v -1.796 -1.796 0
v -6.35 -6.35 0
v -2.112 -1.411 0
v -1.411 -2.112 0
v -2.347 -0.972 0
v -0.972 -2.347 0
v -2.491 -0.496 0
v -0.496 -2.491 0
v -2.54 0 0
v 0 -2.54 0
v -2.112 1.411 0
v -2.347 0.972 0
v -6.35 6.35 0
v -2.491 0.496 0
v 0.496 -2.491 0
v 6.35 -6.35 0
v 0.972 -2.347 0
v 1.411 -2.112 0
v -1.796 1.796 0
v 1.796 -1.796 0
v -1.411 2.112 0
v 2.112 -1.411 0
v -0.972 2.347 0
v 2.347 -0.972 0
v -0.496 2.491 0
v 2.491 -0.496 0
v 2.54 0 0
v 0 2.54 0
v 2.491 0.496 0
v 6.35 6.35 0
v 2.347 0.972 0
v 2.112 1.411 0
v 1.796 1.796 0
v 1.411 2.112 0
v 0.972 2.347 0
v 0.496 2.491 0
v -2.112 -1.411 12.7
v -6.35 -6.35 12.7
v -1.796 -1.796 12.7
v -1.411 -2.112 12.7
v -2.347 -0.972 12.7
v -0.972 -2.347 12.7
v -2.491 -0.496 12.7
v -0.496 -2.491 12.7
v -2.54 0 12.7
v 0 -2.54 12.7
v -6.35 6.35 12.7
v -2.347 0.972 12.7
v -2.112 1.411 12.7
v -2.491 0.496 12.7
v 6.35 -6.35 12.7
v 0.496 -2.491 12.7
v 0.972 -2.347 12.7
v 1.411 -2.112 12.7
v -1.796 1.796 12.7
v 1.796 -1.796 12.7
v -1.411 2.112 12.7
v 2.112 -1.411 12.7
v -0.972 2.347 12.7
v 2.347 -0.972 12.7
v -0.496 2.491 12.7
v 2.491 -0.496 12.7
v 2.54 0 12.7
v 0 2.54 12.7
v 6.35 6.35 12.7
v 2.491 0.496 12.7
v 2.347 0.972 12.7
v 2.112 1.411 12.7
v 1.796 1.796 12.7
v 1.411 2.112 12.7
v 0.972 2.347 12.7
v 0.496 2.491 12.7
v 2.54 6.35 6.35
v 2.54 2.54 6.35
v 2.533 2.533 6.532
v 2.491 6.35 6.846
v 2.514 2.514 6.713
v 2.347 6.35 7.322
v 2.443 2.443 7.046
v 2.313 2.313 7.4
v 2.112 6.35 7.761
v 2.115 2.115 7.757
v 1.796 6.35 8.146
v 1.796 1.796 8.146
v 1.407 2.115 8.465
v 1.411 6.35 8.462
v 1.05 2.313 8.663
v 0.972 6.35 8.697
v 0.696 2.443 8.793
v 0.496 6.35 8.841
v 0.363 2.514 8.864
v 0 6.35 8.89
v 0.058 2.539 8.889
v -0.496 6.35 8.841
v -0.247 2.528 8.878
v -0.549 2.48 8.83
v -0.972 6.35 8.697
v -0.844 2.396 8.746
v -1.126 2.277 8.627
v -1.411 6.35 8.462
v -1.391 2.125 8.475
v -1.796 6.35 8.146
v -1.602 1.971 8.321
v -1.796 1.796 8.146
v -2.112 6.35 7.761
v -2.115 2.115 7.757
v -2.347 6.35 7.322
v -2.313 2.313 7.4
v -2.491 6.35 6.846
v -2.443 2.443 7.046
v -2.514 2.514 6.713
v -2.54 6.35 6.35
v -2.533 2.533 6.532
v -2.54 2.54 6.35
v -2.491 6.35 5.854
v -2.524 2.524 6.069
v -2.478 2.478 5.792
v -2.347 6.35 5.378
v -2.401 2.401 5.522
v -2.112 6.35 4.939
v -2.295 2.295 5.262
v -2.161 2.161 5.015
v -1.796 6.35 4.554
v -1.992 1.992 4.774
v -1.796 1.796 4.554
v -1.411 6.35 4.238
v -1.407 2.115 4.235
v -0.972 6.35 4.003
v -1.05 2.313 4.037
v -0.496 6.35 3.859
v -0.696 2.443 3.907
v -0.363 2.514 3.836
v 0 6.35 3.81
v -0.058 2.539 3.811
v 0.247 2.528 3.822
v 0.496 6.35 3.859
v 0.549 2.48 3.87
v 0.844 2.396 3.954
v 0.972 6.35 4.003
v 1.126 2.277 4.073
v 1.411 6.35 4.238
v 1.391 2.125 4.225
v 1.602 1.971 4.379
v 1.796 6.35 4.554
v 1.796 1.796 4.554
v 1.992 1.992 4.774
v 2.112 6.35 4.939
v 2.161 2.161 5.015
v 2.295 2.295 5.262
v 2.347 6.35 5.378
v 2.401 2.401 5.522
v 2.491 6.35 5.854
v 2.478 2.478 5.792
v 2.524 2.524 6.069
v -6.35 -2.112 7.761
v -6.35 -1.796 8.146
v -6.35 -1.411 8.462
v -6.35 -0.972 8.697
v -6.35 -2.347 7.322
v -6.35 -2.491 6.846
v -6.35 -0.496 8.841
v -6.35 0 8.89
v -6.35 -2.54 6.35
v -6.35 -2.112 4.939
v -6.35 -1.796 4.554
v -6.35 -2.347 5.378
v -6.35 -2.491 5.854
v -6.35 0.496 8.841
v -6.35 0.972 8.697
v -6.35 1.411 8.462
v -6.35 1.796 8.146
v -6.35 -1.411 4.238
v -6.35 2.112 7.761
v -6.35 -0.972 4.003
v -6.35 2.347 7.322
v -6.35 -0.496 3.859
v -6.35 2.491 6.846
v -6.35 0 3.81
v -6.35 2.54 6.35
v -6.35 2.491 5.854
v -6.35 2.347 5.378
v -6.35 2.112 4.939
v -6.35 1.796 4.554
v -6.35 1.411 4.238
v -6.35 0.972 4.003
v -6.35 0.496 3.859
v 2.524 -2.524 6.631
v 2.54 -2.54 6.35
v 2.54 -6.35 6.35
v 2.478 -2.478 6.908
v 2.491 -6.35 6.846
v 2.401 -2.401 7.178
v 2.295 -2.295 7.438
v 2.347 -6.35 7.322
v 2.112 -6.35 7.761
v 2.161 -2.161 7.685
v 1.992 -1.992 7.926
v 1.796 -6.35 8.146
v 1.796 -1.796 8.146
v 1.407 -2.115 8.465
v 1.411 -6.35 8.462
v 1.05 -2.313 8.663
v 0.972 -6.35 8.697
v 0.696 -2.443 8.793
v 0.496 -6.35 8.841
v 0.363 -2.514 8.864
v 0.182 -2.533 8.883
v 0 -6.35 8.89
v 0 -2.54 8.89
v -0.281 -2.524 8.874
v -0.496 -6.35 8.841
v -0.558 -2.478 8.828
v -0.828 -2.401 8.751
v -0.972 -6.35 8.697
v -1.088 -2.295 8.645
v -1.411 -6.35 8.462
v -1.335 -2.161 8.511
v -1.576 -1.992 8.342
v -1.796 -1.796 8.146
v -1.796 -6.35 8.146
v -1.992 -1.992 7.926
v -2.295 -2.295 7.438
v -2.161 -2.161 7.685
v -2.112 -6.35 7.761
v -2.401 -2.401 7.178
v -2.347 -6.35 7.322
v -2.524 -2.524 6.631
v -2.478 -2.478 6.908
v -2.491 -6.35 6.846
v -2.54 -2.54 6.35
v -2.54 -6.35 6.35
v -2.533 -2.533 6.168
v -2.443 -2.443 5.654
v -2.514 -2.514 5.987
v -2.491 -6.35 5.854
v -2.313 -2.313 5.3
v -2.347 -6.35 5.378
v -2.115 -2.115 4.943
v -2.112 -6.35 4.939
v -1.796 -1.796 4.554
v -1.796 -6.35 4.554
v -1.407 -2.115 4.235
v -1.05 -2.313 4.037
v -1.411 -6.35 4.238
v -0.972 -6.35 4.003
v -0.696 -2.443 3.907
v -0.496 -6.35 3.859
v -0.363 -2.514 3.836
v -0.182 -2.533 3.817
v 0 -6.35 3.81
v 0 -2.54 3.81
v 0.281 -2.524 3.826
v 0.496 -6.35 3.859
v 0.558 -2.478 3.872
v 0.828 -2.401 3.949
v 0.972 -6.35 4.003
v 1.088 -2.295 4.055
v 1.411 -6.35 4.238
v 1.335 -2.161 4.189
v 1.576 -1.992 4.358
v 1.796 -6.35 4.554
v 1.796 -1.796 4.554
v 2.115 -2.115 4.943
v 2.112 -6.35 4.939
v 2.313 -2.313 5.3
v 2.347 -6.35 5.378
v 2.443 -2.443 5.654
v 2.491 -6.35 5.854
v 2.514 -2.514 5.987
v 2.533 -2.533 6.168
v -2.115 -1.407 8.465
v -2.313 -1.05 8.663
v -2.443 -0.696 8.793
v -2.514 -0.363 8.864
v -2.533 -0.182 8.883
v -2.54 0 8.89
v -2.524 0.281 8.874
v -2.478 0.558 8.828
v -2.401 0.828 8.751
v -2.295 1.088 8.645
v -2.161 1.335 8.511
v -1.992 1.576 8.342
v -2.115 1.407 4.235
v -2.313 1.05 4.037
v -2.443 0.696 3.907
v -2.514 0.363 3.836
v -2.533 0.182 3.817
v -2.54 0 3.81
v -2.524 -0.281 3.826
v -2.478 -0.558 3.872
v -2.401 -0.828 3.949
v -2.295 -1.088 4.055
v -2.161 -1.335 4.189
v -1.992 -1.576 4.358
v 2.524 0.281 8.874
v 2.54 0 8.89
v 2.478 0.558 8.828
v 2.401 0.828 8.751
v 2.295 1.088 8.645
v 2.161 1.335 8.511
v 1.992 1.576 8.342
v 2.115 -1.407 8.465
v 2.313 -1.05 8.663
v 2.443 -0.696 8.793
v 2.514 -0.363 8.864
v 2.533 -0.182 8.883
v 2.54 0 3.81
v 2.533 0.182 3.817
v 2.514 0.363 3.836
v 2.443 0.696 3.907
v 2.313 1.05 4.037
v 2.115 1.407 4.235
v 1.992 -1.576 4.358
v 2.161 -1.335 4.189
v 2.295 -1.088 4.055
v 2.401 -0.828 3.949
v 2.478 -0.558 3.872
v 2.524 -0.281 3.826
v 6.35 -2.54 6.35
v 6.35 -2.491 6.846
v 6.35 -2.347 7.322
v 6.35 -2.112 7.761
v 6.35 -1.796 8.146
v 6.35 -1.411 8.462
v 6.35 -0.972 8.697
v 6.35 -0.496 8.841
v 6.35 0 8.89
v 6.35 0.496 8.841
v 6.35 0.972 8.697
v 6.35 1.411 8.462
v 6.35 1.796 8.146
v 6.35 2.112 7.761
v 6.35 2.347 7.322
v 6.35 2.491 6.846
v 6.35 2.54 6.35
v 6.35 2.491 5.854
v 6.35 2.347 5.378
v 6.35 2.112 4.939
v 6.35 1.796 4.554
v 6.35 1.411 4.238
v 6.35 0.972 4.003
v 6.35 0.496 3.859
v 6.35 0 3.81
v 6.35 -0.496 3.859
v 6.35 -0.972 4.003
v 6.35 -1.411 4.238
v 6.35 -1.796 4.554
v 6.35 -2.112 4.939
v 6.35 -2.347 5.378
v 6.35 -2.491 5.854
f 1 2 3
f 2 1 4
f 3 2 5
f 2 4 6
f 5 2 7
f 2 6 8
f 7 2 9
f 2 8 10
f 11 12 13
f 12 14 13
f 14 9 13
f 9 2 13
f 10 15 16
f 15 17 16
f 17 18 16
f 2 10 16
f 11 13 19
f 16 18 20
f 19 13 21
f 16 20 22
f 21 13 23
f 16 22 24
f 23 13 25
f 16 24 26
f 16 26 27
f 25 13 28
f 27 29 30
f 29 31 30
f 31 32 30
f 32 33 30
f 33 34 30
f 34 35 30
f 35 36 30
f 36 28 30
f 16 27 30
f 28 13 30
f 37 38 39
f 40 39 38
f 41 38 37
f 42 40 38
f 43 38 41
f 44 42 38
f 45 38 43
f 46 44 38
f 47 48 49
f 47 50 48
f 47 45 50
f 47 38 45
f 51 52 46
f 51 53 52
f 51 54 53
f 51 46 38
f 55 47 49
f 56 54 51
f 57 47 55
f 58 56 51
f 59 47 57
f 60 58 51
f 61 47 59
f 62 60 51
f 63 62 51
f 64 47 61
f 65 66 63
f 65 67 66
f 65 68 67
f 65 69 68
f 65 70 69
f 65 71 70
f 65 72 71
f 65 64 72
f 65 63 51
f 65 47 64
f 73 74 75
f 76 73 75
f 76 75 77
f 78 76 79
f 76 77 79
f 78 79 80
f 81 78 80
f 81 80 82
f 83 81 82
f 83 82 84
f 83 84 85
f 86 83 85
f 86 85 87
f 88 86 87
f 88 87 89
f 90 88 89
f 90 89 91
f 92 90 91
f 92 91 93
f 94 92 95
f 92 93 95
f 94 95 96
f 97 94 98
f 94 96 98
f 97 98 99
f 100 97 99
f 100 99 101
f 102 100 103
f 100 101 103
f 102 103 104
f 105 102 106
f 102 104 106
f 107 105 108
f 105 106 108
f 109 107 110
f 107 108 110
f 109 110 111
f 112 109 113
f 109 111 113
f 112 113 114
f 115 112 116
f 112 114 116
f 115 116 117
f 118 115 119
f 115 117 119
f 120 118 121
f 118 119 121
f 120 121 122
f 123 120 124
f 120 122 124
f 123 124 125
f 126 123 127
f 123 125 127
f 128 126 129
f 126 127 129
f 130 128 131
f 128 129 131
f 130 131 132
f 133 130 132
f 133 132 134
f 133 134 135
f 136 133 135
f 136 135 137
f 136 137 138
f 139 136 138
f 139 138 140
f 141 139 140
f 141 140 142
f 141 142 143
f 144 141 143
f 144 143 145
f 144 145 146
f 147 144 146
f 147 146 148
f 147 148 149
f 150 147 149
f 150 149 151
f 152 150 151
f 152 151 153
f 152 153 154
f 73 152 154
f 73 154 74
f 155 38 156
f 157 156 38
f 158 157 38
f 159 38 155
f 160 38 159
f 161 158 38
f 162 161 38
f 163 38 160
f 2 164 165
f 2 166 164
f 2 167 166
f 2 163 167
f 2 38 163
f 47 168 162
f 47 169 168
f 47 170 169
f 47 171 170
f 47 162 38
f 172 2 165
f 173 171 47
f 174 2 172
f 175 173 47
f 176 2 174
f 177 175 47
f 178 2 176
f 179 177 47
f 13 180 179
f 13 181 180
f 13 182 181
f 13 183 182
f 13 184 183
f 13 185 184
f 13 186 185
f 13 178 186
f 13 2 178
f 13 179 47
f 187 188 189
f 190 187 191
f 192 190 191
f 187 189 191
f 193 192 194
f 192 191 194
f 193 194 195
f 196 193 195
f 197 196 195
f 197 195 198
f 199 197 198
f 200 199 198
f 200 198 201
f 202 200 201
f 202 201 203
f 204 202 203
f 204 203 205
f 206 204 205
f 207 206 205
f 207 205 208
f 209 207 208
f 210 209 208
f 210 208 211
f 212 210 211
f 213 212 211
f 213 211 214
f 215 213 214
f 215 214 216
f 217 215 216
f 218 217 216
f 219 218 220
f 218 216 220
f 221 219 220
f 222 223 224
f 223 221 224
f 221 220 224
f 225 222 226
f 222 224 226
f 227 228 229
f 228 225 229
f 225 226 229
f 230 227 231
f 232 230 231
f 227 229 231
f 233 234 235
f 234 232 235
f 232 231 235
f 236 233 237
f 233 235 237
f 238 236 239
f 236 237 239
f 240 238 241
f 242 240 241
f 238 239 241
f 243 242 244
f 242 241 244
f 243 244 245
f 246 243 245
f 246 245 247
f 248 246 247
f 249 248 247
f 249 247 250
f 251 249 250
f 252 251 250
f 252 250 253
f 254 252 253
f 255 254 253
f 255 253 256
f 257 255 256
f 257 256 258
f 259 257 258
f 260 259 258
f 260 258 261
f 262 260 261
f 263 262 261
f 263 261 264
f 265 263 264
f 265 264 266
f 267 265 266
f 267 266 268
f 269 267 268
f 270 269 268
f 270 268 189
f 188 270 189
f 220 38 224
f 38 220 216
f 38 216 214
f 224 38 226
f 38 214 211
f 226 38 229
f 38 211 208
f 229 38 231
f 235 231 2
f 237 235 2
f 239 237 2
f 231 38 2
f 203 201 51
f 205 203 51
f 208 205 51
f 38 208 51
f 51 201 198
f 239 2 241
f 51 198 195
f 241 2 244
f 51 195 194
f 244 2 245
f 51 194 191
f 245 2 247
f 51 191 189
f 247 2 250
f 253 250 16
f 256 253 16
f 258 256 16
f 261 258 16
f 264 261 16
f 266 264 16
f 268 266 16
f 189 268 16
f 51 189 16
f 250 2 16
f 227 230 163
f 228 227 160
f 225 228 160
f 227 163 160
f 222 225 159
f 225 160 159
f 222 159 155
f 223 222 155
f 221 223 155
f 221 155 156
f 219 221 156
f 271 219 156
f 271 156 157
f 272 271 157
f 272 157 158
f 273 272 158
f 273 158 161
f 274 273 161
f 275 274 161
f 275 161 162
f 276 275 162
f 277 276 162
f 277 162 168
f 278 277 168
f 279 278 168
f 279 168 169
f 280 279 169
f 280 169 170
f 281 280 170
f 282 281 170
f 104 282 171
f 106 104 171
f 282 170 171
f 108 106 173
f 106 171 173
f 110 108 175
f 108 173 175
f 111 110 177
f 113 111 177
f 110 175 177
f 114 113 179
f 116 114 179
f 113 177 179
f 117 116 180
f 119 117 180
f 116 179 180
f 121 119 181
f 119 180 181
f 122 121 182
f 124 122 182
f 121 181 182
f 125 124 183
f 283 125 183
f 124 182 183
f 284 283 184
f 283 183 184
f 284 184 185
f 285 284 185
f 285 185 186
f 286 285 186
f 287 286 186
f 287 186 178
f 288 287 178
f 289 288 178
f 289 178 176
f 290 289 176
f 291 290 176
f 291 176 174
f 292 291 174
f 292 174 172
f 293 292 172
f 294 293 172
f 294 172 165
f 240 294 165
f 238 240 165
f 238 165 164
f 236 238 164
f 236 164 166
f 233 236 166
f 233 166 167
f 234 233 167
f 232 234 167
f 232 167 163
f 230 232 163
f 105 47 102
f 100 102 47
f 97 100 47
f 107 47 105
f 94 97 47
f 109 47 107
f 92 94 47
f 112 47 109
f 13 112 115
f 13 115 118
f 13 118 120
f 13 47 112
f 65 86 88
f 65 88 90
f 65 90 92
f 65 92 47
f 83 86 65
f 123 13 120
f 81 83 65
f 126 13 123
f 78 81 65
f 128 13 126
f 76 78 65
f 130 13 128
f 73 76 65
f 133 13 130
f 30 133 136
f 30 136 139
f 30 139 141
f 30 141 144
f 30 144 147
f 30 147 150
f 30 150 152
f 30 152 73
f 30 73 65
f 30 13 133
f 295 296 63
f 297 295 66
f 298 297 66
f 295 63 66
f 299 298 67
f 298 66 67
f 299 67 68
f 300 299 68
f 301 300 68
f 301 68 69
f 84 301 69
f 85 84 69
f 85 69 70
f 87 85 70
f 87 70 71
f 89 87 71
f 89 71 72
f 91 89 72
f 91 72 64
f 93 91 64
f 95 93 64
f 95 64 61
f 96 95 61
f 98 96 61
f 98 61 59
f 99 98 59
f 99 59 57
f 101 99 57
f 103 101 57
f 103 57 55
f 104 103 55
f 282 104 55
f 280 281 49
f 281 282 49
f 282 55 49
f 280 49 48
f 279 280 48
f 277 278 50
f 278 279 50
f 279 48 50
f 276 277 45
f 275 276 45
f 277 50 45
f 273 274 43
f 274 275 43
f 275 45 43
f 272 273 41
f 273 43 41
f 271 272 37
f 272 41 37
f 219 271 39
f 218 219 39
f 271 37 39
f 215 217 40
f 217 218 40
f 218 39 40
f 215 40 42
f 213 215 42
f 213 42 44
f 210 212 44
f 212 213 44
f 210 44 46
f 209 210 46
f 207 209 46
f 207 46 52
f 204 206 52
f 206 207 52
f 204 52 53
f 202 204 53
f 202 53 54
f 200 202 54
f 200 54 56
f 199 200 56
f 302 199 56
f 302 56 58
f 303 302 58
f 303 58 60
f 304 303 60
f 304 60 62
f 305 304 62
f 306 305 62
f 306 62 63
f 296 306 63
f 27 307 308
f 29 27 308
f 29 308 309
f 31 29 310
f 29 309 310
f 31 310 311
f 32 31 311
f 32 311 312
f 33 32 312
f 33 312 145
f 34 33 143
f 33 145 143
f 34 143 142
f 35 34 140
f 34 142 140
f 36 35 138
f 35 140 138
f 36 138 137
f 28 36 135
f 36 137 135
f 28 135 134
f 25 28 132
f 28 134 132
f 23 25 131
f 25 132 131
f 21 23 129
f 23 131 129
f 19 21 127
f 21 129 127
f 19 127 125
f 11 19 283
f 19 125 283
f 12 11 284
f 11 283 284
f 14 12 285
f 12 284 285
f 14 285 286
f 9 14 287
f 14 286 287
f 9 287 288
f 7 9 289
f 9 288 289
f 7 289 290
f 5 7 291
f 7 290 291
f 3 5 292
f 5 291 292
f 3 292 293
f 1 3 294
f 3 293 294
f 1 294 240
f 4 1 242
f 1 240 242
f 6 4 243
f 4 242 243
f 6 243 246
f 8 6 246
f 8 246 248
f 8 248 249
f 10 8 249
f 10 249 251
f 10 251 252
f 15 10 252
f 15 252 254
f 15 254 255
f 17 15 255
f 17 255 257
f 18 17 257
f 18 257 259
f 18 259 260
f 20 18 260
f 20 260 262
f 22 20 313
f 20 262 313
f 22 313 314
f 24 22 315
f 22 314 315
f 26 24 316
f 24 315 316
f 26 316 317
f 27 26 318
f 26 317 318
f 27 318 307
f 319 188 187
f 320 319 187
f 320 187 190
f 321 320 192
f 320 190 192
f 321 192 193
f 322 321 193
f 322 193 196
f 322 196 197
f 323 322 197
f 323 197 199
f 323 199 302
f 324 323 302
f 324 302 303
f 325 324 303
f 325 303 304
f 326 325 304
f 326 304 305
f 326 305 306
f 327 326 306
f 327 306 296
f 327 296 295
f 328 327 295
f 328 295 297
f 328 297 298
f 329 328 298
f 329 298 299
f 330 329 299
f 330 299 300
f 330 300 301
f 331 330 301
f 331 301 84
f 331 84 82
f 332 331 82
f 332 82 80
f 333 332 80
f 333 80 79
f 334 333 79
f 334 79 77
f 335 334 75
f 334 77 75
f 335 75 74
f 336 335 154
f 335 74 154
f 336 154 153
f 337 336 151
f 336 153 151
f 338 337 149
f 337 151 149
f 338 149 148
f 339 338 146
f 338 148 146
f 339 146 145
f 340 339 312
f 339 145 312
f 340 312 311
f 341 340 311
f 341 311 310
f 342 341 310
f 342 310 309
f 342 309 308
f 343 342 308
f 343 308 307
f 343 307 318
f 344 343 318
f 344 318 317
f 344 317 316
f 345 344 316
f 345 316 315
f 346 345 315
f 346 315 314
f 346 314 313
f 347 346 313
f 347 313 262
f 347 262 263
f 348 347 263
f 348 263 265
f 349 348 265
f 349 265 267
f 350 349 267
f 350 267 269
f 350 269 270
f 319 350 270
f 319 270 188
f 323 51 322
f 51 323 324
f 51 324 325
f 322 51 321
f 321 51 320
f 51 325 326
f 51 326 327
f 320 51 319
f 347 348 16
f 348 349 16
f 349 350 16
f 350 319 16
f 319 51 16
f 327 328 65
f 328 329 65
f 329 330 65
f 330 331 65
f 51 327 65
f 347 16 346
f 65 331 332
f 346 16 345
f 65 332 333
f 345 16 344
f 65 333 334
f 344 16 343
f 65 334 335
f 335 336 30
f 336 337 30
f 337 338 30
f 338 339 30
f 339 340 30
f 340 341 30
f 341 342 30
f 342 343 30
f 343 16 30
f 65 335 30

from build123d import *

# Parameters (mm, degrees)
F0_W     = 12.7
F0_H     = 12.7
F1_DEPTH = 12.7
F2_R     = 2.54
F3_DEPTH = 25.4
F4_R     = 2.54
F5_DEPTH = 25.4
F6_R     = 2.54
F7_DEPTH = 25.4


with BuildPart() as f1:
    # F0 (on Top) → F1 (new body)
    with BuildSketch(Plane.XY):
        Rectangle(F0_W, F0_H)
    extrude(amount=F1_DEPTH)

    # F2 (on face) → F3 (cut)
    with BuildSketch(Plane(origin=(-6.35, 0, 0), x_dir=(0, -1, 0), z_dir=(-1, 0, 0))):
        with Locations((0, 6.35)):
            Circle(F2_R)
    extrude(amount=-F3_DEPTH, mode=Mode.SUBTRACT)

    # F4 (on face) → F5 (cut)
    with BuildSketch(Plane.XZ.offset(6.35)):
        with Locations((0, 6.35)):
            Circle(F4_R)
    extrude(amount=-F5_DEPTH, mode=Mode.SUBTRACT)

    # F6 (on face) → F7 (cut)
    with BuildSketch(Plane.XY.offset(12.7)):
        Circle(F6_R)
    extrude(amount=-F7_DEPTH, mode=Mode.SUBTRACT)


solid = f1.part
